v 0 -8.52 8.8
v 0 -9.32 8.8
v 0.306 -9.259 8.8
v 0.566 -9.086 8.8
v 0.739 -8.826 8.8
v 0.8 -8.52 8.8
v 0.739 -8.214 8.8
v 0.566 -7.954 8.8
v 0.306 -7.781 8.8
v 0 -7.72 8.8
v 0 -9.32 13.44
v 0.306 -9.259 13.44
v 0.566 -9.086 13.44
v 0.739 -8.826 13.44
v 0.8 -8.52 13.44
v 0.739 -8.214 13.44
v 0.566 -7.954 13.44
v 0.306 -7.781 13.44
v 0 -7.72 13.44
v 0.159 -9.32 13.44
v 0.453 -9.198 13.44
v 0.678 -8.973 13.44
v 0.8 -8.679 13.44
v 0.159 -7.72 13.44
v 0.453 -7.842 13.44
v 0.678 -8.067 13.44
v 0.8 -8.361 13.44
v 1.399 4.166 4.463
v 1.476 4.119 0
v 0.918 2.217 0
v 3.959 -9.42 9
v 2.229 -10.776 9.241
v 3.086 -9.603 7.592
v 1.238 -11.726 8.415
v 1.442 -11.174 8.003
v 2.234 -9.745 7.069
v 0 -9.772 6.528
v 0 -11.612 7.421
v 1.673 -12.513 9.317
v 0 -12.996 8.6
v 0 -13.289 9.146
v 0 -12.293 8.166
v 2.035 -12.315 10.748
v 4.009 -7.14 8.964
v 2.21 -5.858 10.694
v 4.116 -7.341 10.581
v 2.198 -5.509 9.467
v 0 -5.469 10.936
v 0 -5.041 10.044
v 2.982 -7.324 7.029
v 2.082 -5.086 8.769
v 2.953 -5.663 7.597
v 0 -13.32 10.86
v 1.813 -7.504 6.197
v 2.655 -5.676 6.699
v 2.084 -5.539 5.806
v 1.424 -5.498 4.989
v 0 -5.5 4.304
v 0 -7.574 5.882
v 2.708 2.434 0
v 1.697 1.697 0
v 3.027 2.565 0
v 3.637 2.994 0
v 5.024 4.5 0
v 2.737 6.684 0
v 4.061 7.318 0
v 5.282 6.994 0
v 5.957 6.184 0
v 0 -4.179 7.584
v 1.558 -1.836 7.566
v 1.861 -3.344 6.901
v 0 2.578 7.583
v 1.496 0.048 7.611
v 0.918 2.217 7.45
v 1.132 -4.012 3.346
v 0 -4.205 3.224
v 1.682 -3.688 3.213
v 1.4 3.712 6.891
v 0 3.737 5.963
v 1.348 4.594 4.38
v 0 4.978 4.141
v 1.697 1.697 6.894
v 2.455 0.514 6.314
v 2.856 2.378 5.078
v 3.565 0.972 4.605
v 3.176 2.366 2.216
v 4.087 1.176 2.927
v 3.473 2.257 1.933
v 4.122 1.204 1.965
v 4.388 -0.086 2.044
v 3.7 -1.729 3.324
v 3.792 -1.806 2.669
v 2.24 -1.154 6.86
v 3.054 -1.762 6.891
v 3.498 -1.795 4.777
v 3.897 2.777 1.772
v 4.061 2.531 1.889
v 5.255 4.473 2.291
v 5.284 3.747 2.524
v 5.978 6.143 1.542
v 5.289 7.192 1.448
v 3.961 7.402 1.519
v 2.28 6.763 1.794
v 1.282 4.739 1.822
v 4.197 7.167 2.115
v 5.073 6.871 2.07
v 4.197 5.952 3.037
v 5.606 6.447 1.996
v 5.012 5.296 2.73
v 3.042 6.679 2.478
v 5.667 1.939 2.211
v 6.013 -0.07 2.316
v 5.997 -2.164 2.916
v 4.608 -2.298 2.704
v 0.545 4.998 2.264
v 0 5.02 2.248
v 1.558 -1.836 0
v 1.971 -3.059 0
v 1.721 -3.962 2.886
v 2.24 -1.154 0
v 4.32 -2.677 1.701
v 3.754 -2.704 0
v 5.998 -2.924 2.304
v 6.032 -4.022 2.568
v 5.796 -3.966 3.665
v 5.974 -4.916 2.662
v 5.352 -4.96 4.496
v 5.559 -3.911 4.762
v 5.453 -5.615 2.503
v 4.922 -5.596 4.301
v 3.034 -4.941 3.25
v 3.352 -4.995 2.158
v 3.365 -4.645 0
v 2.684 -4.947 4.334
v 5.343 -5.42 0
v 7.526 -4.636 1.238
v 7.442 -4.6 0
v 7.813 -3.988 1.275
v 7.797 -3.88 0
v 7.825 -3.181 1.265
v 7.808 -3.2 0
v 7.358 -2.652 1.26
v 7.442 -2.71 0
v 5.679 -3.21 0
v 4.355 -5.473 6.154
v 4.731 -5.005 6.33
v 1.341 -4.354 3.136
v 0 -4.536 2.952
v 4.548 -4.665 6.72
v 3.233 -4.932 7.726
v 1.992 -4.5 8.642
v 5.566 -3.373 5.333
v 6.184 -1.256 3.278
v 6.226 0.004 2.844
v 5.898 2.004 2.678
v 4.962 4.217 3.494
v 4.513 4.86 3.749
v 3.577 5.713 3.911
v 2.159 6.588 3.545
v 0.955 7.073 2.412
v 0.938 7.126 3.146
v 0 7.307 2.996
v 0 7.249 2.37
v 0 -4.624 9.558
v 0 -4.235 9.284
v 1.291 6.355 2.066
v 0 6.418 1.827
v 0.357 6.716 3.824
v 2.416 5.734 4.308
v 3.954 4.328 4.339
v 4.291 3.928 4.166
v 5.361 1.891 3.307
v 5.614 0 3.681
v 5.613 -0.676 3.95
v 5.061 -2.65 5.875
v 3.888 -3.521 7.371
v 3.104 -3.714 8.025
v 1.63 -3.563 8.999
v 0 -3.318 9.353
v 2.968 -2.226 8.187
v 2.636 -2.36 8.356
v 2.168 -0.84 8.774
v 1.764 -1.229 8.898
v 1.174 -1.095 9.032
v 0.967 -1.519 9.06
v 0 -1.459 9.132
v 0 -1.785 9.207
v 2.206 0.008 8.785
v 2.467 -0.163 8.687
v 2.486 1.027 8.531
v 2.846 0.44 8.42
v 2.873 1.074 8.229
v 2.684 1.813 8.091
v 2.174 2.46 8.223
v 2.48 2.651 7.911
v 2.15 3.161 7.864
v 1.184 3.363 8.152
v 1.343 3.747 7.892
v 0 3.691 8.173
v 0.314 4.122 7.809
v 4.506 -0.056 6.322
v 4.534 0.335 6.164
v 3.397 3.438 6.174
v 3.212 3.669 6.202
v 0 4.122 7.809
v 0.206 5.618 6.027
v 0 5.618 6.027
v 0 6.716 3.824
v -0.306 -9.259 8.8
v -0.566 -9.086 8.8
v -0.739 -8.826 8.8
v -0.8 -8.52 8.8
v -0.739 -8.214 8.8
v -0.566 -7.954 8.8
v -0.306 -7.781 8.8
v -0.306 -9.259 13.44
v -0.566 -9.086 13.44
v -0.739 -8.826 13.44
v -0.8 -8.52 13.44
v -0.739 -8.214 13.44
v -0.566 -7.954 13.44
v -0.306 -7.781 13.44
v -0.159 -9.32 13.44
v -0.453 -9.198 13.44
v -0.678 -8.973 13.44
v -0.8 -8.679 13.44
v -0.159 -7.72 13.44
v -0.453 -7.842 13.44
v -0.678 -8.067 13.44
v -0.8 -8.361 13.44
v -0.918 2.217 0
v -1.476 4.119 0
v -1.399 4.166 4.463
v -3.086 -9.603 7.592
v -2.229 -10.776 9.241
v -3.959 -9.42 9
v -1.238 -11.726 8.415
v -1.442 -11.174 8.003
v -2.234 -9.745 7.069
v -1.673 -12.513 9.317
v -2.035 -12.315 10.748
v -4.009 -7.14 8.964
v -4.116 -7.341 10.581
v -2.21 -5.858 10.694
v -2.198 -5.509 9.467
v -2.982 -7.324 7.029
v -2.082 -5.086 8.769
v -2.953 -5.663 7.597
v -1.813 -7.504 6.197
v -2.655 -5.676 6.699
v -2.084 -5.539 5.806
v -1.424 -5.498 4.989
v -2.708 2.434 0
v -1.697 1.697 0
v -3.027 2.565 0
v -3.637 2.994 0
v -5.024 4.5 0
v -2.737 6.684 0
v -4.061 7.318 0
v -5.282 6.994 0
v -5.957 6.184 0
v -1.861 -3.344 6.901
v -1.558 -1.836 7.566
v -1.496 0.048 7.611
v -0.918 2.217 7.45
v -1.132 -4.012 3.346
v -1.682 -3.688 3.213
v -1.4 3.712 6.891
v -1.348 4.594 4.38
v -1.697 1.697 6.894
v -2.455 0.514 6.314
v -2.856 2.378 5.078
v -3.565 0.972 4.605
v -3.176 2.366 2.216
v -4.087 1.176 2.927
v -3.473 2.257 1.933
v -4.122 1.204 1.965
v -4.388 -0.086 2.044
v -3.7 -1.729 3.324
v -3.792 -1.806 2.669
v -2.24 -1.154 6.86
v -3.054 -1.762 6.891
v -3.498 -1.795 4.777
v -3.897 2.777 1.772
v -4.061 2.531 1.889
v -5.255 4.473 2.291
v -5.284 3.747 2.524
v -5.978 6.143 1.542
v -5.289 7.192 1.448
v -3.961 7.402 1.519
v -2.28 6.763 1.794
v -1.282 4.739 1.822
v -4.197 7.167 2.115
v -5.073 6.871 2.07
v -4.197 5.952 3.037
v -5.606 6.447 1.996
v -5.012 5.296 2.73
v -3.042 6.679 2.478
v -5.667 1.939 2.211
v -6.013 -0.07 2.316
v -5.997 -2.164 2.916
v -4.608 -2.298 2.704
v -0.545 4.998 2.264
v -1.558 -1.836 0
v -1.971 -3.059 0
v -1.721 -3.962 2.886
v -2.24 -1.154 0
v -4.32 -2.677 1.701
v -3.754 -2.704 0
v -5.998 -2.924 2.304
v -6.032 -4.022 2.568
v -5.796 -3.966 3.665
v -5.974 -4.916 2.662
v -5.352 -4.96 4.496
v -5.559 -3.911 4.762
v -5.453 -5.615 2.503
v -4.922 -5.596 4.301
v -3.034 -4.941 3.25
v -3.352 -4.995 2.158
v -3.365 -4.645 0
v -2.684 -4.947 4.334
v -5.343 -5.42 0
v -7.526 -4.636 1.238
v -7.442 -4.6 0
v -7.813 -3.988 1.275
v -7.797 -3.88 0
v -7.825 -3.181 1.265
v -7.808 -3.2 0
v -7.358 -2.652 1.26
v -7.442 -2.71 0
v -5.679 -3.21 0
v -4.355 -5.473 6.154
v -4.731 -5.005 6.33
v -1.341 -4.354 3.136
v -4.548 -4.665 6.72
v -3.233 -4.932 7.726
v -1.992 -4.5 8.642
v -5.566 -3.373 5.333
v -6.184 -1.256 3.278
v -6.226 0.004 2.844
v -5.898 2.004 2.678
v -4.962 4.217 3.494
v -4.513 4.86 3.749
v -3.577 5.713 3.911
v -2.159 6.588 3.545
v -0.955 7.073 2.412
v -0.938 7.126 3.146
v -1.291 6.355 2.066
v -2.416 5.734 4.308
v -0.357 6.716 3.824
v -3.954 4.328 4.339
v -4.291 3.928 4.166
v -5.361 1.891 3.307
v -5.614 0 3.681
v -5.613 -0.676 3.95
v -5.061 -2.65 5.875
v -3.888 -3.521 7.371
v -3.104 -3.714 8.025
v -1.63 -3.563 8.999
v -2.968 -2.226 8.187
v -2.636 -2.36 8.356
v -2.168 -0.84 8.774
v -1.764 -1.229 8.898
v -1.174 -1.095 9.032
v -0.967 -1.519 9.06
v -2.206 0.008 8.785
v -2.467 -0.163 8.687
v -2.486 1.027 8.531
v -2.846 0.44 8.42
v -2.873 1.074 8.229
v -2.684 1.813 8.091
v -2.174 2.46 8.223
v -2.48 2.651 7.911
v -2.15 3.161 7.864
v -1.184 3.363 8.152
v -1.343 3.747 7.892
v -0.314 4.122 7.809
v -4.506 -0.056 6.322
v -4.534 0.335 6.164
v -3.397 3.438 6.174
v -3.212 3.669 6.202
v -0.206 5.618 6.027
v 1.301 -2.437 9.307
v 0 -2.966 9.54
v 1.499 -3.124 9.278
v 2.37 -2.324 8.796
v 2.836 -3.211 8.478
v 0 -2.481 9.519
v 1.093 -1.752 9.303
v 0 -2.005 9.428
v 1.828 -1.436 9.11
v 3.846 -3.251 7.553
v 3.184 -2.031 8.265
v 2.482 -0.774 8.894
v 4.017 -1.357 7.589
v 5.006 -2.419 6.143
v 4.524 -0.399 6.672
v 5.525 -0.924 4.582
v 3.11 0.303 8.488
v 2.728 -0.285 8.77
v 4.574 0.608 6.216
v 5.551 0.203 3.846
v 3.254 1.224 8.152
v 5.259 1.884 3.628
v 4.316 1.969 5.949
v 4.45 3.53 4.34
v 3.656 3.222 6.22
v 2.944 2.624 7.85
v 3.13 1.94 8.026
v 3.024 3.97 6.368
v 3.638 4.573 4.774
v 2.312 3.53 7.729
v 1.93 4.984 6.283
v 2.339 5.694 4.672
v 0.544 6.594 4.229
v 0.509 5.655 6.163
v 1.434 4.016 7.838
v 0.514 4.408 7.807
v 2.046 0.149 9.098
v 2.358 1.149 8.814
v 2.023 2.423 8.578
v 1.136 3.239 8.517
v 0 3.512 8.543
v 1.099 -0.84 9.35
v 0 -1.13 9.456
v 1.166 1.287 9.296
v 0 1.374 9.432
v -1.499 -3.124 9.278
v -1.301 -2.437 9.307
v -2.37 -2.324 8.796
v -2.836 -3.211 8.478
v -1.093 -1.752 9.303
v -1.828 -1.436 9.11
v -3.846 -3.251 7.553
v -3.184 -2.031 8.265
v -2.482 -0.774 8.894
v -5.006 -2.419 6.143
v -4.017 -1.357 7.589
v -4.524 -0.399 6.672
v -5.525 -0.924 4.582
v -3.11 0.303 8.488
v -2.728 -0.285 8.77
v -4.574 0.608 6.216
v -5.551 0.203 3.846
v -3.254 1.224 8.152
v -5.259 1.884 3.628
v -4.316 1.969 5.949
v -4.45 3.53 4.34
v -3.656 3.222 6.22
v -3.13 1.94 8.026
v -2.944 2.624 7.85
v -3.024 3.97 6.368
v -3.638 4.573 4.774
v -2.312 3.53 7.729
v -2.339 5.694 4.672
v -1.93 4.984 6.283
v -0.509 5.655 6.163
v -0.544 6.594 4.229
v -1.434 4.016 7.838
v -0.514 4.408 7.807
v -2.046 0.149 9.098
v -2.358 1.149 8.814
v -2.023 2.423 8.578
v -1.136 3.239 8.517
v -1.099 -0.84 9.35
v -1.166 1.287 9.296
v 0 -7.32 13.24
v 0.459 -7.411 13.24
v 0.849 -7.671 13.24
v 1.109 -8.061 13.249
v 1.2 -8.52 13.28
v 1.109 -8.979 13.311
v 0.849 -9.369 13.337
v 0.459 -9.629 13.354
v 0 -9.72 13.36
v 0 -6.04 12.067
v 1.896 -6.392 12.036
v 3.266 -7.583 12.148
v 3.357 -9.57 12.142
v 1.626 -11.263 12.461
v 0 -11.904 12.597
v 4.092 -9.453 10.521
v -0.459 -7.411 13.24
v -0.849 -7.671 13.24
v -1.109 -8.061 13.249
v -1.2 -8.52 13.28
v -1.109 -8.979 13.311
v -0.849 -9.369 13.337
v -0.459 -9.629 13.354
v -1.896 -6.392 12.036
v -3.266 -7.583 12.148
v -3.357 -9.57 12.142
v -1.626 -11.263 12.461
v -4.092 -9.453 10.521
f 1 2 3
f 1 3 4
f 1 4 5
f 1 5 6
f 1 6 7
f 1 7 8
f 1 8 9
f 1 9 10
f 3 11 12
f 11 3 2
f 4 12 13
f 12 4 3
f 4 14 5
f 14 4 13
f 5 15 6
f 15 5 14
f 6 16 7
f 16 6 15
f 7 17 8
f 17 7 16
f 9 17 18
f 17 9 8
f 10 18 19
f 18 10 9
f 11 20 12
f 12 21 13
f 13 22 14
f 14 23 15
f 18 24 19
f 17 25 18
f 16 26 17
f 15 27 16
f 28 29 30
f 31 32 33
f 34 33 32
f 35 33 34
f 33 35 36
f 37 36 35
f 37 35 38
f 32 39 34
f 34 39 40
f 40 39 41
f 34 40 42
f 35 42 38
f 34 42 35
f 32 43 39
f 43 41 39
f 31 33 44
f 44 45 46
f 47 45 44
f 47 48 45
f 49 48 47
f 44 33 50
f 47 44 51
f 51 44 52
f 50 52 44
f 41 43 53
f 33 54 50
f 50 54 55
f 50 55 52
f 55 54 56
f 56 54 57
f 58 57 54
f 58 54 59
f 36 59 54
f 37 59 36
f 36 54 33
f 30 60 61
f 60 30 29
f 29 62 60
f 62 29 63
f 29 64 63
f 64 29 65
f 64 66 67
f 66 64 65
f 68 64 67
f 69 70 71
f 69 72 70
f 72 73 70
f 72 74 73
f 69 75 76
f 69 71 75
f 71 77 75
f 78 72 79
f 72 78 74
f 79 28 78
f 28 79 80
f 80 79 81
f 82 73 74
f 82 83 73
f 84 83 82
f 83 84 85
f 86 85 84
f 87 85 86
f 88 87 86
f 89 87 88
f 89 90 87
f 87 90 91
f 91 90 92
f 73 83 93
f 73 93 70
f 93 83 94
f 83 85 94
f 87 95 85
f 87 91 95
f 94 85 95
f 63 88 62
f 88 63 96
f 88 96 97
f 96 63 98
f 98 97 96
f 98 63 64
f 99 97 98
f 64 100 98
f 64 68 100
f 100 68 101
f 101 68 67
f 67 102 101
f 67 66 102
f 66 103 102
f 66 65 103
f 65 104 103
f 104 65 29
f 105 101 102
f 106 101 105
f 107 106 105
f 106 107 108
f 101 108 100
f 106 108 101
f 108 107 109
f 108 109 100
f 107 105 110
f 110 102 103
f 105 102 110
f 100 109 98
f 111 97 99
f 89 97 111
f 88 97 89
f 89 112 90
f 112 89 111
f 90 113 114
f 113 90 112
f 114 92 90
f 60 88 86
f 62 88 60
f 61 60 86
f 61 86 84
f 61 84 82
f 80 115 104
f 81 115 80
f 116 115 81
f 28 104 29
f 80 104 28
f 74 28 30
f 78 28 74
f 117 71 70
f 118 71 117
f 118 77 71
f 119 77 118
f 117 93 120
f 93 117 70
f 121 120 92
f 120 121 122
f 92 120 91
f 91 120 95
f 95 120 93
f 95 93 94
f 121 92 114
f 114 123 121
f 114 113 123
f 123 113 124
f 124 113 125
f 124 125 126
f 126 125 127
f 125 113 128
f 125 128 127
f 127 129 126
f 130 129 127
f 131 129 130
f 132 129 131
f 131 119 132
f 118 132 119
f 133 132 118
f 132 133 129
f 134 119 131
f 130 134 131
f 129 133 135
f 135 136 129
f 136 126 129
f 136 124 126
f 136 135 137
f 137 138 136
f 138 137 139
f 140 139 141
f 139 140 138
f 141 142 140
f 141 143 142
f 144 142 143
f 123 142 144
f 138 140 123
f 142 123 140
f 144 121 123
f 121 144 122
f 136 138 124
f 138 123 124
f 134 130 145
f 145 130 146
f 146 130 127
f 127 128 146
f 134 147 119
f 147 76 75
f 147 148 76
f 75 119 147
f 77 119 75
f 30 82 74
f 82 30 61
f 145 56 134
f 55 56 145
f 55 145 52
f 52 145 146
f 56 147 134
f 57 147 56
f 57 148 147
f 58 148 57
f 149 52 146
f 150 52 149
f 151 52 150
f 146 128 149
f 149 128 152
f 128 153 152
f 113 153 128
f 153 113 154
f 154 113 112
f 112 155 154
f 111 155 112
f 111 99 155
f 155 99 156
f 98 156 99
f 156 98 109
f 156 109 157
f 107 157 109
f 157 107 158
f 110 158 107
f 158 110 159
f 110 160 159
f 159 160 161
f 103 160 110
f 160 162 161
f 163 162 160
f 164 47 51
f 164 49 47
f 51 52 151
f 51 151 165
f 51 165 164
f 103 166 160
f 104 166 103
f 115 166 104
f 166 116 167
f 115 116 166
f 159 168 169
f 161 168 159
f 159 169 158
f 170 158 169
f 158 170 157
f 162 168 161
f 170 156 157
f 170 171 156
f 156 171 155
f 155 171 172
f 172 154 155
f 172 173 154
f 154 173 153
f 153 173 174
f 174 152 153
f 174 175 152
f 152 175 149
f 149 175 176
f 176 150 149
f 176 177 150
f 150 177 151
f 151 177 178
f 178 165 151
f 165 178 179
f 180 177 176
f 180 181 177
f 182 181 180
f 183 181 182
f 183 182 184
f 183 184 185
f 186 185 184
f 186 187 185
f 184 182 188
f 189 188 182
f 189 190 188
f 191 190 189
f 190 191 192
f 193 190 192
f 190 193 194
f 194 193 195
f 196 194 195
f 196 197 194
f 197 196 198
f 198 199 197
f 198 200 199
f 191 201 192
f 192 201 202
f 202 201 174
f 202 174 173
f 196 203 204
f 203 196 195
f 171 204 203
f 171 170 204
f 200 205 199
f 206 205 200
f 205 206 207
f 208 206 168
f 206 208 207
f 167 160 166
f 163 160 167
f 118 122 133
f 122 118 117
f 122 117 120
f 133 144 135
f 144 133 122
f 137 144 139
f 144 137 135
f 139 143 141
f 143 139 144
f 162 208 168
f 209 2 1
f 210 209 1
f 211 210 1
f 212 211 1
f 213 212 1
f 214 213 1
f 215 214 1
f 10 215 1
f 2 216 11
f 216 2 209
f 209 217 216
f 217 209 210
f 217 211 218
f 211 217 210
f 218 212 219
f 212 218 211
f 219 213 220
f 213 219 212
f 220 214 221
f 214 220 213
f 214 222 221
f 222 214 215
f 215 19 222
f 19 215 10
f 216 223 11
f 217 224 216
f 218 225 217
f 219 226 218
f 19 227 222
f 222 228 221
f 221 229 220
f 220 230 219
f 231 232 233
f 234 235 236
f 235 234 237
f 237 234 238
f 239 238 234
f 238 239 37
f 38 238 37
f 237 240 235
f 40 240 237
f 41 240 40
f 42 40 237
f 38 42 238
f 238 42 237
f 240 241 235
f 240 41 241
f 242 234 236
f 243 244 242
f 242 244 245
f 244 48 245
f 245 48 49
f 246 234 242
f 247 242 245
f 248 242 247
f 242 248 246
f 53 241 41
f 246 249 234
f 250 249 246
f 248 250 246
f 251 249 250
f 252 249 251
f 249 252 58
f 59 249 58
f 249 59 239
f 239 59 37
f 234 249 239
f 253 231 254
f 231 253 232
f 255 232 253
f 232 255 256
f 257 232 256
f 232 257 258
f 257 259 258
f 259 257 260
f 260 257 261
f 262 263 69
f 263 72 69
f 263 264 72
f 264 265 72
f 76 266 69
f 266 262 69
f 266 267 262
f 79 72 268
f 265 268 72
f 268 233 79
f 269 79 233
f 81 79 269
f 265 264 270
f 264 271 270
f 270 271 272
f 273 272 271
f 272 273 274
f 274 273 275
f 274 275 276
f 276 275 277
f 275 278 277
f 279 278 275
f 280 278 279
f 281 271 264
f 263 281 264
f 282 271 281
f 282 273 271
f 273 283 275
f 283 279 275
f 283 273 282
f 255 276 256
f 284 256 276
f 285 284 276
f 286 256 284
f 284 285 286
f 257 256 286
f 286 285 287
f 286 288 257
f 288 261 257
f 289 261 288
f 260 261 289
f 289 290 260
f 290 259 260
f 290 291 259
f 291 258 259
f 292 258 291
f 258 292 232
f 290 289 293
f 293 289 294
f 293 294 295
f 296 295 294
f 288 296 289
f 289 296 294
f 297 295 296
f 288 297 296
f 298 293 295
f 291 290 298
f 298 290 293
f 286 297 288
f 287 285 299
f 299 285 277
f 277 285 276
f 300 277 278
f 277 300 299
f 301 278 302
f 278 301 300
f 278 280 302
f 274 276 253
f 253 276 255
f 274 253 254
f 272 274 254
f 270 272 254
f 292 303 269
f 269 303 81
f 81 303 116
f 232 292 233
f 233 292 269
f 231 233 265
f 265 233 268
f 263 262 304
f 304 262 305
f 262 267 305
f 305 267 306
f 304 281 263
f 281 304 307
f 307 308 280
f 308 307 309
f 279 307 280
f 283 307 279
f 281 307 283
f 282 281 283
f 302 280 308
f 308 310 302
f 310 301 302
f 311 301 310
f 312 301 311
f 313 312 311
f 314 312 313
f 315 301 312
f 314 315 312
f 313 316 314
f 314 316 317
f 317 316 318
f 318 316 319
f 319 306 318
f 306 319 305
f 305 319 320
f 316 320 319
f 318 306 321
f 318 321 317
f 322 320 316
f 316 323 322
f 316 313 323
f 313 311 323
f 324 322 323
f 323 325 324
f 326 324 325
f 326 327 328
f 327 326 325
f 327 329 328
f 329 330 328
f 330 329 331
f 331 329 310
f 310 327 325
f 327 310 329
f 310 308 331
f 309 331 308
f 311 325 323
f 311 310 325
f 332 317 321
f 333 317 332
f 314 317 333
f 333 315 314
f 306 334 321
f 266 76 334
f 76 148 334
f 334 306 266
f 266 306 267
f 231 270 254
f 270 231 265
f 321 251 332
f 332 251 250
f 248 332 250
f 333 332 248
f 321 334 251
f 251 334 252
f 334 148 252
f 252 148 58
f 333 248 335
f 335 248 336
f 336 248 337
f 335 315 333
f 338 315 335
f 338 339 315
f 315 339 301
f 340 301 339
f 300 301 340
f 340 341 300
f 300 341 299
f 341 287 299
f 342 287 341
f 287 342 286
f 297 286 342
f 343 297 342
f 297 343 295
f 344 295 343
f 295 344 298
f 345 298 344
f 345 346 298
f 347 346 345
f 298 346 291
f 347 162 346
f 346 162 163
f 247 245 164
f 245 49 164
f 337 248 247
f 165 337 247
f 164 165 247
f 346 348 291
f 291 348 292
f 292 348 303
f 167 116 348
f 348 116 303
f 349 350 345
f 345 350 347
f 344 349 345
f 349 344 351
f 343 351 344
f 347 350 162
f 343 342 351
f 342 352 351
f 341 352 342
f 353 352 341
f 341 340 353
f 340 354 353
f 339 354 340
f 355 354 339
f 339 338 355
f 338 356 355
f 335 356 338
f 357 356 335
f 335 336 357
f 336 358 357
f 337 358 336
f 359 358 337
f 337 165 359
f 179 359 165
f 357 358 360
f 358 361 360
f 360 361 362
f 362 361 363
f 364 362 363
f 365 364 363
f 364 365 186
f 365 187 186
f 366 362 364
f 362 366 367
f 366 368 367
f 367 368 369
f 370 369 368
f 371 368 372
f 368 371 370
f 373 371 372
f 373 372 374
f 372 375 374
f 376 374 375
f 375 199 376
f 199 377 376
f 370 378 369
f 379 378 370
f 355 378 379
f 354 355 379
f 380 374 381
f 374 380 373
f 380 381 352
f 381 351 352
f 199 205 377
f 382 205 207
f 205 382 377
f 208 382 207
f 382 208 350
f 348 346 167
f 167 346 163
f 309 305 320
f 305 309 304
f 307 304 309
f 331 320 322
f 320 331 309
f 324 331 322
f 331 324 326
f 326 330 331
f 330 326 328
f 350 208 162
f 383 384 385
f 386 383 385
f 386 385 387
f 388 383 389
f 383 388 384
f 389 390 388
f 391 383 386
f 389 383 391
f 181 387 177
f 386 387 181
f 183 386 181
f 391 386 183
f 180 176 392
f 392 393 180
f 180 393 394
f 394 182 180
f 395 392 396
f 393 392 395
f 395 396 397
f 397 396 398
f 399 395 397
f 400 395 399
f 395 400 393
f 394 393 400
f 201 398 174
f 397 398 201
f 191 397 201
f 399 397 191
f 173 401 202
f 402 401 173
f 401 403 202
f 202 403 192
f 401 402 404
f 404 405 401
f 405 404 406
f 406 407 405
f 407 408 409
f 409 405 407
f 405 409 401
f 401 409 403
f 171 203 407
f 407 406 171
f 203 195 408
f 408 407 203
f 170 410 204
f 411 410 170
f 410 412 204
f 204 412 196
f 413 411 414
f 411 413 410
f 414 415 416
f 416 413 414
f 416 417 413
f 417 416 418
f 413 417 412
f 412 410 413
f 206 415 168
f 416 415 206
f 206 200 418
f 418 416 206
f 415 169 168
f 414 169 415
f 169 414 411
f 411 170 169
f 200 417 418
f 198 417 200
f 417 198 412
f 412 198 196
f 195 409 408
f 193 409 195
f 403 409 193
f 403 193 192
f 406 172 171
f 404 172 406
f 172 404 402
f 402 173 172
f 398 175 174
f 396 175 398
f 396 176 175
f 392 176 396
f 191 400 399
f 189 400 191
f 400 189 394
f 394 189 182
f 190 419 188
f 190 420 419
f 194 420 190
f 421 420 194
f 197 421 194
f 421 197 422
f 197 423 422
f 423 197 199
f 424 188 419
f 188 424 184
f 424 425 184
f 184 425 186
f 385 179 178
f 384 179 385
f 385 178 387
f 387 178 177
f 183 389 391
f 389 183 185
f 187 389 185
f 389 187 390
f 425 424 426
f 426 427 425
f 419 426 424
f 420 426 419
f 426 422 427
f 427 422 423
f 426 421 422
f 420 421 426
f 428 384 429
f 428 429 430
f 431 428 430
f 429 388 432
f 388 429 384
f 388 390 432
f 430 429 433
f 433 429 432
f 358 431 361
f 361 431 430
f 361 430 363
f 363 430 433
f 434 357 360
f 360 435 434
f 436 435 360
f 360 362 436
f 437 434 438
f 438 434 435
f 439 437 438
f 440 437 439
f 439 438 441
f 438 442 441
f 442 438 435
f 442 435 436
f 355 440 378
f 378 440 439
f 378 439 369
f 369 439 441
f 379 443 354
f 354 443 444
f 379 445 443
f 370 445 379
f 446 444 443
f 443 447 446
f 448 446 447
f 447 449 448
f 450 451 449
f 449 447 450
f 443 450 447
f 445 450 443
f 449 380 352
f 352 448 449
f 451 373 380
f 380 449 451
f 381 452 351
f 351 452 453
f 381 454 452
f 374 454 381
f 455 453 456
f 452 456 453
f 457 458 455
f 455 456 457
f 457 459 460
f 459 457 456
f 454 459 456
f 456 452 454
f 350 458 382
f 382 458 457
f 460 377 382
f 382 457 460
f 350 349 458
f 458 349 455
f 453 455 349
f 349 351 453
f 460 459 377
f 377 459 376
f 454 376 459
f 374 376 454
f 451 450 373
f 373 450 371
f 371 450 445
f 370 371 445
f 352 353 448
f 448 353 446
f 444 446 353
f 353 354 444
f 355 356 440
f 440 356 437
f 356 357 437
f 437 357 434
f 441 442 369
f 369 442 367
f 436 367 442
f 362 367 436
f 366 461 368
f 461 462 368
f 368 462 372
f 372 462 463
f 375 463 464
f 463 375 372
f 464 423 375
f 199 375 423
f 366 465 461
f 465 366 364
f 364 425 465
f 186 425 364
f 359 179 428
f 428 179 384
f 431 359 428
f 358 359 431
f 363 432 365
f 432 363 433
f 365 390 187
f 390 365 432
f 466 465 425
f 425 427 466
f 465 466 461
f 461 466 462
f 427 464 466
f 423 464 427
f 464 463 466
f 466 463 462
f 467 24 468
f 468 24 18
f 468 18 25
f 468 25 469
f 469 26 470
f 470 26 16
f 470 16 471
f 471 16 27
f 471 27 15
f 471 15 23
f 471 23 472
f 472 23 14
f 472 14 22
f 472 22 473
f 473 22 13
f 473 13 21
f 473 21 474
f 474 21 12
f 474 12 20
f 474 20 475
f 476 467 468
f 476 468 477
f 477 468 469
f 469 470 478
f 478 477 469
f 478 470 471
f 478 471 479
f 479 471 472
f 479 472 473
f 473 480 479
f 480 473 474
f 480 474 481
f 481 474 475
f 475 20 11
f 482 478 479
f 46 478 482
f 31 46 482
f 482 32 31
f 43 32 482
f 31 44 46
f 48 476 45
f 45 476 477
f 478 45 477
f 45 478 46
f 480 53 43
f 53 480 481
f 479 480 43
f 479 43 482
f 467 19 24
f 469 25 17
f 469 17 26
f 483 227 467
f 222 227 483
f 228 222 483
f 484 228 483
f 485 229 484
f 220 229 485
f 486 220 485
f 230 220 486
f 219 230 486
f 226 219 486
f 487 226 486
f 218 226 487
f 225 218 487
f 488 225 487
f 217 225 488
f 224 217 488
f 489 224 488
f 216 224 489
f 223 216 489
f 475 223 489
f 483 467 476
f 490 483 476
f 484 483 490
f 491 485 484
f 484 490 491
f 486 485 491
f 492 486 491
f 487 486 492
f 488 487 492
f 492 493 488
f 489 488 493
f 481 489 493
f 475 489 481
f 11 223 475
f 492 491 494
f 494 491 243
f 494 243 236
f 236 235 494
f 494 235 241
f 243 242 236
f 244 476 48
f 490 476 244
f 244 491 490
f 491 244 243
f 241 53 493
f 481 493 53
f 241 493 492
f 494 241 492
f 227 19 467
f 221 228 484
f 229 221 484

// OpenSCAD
use <../lib.scad>
use <s/11603s01.scad>
use <s/11603s03.scad>
use <s/11603s04.scad>
function ldraw_lib__11603() = [
// 0 Animal Turtle
// 0 Name: 11603.dat
// 0 Author: Gerald Lasser [GeraldLasser]
// 0 !LDRAW_ORG Part UPDATE 2026-01
// 0 !LICENSE Licensed under CC BY 4.0 : see CAreadme.txt
// 
// 0 BFC CERTIFY CCW
  [0,"BFC","CERTIFY"],
  [0,"BFC","CCW"],
// 
// 0 !HISTORY 2024-12-14 {LEGO Instructions App} Original part shape
// 0 !HISTORY 2024-12-14 [GeraldLasser] File preparation for LDraw Parts Tracker
// 0 !HISTORY 2026-01-29 [OrionP] Official Update 2026-01
// 
// 1 16 0 0 0 1 0 0 0 1 0 0 0 1 s\11603s01.dat
  [1,16,0,0,0,1,0,0,0,1,0,0,0,1, ldraw_lib__s__11603s01()],
// 
// 1 16 0 0 0 1 0 0 0 1 0 0 0 1 s\11603s03.dat
  [1,16,0,0,0,1,0,0,0,1,0,0,0,1, ldraw_lib__s__11603s03()],
// 1 16 0 0 0 -1 0 0 0 1 0 0 0 1 s\11603s03.dat
  [1,16,0,0,0,-1,0,0,0,1,0,0,0,1, ldraw_lib__s__11603s03()],
// 
// 1 16 0 0 0 1 0 0 0 1 0 0 0 1 s\11603s04.dat
  [1,16,0,0,0,1,0,0,0,1,0,0,0,1, ldraw_lib__s__11603s04()],
// 1 16 0 0 0 -1 0 0 0 1 0 0 0 1 s\11603s04.dat
  [1,16,0,0,0,-1,0,0,0,1,0,0,0,1, ldraw_lib__s__11603s04()],
];
module ldraw_lib__11603(step=0, col=false, unit=2/5, alt=false, line=0.2, solid=!$preview)
    makepoly(ldraw_lib__11603(), step=step, col=col, unit=unit, alt=alt, line=line, solid=solid);
ldraw_lib__11603(line=0.2);
